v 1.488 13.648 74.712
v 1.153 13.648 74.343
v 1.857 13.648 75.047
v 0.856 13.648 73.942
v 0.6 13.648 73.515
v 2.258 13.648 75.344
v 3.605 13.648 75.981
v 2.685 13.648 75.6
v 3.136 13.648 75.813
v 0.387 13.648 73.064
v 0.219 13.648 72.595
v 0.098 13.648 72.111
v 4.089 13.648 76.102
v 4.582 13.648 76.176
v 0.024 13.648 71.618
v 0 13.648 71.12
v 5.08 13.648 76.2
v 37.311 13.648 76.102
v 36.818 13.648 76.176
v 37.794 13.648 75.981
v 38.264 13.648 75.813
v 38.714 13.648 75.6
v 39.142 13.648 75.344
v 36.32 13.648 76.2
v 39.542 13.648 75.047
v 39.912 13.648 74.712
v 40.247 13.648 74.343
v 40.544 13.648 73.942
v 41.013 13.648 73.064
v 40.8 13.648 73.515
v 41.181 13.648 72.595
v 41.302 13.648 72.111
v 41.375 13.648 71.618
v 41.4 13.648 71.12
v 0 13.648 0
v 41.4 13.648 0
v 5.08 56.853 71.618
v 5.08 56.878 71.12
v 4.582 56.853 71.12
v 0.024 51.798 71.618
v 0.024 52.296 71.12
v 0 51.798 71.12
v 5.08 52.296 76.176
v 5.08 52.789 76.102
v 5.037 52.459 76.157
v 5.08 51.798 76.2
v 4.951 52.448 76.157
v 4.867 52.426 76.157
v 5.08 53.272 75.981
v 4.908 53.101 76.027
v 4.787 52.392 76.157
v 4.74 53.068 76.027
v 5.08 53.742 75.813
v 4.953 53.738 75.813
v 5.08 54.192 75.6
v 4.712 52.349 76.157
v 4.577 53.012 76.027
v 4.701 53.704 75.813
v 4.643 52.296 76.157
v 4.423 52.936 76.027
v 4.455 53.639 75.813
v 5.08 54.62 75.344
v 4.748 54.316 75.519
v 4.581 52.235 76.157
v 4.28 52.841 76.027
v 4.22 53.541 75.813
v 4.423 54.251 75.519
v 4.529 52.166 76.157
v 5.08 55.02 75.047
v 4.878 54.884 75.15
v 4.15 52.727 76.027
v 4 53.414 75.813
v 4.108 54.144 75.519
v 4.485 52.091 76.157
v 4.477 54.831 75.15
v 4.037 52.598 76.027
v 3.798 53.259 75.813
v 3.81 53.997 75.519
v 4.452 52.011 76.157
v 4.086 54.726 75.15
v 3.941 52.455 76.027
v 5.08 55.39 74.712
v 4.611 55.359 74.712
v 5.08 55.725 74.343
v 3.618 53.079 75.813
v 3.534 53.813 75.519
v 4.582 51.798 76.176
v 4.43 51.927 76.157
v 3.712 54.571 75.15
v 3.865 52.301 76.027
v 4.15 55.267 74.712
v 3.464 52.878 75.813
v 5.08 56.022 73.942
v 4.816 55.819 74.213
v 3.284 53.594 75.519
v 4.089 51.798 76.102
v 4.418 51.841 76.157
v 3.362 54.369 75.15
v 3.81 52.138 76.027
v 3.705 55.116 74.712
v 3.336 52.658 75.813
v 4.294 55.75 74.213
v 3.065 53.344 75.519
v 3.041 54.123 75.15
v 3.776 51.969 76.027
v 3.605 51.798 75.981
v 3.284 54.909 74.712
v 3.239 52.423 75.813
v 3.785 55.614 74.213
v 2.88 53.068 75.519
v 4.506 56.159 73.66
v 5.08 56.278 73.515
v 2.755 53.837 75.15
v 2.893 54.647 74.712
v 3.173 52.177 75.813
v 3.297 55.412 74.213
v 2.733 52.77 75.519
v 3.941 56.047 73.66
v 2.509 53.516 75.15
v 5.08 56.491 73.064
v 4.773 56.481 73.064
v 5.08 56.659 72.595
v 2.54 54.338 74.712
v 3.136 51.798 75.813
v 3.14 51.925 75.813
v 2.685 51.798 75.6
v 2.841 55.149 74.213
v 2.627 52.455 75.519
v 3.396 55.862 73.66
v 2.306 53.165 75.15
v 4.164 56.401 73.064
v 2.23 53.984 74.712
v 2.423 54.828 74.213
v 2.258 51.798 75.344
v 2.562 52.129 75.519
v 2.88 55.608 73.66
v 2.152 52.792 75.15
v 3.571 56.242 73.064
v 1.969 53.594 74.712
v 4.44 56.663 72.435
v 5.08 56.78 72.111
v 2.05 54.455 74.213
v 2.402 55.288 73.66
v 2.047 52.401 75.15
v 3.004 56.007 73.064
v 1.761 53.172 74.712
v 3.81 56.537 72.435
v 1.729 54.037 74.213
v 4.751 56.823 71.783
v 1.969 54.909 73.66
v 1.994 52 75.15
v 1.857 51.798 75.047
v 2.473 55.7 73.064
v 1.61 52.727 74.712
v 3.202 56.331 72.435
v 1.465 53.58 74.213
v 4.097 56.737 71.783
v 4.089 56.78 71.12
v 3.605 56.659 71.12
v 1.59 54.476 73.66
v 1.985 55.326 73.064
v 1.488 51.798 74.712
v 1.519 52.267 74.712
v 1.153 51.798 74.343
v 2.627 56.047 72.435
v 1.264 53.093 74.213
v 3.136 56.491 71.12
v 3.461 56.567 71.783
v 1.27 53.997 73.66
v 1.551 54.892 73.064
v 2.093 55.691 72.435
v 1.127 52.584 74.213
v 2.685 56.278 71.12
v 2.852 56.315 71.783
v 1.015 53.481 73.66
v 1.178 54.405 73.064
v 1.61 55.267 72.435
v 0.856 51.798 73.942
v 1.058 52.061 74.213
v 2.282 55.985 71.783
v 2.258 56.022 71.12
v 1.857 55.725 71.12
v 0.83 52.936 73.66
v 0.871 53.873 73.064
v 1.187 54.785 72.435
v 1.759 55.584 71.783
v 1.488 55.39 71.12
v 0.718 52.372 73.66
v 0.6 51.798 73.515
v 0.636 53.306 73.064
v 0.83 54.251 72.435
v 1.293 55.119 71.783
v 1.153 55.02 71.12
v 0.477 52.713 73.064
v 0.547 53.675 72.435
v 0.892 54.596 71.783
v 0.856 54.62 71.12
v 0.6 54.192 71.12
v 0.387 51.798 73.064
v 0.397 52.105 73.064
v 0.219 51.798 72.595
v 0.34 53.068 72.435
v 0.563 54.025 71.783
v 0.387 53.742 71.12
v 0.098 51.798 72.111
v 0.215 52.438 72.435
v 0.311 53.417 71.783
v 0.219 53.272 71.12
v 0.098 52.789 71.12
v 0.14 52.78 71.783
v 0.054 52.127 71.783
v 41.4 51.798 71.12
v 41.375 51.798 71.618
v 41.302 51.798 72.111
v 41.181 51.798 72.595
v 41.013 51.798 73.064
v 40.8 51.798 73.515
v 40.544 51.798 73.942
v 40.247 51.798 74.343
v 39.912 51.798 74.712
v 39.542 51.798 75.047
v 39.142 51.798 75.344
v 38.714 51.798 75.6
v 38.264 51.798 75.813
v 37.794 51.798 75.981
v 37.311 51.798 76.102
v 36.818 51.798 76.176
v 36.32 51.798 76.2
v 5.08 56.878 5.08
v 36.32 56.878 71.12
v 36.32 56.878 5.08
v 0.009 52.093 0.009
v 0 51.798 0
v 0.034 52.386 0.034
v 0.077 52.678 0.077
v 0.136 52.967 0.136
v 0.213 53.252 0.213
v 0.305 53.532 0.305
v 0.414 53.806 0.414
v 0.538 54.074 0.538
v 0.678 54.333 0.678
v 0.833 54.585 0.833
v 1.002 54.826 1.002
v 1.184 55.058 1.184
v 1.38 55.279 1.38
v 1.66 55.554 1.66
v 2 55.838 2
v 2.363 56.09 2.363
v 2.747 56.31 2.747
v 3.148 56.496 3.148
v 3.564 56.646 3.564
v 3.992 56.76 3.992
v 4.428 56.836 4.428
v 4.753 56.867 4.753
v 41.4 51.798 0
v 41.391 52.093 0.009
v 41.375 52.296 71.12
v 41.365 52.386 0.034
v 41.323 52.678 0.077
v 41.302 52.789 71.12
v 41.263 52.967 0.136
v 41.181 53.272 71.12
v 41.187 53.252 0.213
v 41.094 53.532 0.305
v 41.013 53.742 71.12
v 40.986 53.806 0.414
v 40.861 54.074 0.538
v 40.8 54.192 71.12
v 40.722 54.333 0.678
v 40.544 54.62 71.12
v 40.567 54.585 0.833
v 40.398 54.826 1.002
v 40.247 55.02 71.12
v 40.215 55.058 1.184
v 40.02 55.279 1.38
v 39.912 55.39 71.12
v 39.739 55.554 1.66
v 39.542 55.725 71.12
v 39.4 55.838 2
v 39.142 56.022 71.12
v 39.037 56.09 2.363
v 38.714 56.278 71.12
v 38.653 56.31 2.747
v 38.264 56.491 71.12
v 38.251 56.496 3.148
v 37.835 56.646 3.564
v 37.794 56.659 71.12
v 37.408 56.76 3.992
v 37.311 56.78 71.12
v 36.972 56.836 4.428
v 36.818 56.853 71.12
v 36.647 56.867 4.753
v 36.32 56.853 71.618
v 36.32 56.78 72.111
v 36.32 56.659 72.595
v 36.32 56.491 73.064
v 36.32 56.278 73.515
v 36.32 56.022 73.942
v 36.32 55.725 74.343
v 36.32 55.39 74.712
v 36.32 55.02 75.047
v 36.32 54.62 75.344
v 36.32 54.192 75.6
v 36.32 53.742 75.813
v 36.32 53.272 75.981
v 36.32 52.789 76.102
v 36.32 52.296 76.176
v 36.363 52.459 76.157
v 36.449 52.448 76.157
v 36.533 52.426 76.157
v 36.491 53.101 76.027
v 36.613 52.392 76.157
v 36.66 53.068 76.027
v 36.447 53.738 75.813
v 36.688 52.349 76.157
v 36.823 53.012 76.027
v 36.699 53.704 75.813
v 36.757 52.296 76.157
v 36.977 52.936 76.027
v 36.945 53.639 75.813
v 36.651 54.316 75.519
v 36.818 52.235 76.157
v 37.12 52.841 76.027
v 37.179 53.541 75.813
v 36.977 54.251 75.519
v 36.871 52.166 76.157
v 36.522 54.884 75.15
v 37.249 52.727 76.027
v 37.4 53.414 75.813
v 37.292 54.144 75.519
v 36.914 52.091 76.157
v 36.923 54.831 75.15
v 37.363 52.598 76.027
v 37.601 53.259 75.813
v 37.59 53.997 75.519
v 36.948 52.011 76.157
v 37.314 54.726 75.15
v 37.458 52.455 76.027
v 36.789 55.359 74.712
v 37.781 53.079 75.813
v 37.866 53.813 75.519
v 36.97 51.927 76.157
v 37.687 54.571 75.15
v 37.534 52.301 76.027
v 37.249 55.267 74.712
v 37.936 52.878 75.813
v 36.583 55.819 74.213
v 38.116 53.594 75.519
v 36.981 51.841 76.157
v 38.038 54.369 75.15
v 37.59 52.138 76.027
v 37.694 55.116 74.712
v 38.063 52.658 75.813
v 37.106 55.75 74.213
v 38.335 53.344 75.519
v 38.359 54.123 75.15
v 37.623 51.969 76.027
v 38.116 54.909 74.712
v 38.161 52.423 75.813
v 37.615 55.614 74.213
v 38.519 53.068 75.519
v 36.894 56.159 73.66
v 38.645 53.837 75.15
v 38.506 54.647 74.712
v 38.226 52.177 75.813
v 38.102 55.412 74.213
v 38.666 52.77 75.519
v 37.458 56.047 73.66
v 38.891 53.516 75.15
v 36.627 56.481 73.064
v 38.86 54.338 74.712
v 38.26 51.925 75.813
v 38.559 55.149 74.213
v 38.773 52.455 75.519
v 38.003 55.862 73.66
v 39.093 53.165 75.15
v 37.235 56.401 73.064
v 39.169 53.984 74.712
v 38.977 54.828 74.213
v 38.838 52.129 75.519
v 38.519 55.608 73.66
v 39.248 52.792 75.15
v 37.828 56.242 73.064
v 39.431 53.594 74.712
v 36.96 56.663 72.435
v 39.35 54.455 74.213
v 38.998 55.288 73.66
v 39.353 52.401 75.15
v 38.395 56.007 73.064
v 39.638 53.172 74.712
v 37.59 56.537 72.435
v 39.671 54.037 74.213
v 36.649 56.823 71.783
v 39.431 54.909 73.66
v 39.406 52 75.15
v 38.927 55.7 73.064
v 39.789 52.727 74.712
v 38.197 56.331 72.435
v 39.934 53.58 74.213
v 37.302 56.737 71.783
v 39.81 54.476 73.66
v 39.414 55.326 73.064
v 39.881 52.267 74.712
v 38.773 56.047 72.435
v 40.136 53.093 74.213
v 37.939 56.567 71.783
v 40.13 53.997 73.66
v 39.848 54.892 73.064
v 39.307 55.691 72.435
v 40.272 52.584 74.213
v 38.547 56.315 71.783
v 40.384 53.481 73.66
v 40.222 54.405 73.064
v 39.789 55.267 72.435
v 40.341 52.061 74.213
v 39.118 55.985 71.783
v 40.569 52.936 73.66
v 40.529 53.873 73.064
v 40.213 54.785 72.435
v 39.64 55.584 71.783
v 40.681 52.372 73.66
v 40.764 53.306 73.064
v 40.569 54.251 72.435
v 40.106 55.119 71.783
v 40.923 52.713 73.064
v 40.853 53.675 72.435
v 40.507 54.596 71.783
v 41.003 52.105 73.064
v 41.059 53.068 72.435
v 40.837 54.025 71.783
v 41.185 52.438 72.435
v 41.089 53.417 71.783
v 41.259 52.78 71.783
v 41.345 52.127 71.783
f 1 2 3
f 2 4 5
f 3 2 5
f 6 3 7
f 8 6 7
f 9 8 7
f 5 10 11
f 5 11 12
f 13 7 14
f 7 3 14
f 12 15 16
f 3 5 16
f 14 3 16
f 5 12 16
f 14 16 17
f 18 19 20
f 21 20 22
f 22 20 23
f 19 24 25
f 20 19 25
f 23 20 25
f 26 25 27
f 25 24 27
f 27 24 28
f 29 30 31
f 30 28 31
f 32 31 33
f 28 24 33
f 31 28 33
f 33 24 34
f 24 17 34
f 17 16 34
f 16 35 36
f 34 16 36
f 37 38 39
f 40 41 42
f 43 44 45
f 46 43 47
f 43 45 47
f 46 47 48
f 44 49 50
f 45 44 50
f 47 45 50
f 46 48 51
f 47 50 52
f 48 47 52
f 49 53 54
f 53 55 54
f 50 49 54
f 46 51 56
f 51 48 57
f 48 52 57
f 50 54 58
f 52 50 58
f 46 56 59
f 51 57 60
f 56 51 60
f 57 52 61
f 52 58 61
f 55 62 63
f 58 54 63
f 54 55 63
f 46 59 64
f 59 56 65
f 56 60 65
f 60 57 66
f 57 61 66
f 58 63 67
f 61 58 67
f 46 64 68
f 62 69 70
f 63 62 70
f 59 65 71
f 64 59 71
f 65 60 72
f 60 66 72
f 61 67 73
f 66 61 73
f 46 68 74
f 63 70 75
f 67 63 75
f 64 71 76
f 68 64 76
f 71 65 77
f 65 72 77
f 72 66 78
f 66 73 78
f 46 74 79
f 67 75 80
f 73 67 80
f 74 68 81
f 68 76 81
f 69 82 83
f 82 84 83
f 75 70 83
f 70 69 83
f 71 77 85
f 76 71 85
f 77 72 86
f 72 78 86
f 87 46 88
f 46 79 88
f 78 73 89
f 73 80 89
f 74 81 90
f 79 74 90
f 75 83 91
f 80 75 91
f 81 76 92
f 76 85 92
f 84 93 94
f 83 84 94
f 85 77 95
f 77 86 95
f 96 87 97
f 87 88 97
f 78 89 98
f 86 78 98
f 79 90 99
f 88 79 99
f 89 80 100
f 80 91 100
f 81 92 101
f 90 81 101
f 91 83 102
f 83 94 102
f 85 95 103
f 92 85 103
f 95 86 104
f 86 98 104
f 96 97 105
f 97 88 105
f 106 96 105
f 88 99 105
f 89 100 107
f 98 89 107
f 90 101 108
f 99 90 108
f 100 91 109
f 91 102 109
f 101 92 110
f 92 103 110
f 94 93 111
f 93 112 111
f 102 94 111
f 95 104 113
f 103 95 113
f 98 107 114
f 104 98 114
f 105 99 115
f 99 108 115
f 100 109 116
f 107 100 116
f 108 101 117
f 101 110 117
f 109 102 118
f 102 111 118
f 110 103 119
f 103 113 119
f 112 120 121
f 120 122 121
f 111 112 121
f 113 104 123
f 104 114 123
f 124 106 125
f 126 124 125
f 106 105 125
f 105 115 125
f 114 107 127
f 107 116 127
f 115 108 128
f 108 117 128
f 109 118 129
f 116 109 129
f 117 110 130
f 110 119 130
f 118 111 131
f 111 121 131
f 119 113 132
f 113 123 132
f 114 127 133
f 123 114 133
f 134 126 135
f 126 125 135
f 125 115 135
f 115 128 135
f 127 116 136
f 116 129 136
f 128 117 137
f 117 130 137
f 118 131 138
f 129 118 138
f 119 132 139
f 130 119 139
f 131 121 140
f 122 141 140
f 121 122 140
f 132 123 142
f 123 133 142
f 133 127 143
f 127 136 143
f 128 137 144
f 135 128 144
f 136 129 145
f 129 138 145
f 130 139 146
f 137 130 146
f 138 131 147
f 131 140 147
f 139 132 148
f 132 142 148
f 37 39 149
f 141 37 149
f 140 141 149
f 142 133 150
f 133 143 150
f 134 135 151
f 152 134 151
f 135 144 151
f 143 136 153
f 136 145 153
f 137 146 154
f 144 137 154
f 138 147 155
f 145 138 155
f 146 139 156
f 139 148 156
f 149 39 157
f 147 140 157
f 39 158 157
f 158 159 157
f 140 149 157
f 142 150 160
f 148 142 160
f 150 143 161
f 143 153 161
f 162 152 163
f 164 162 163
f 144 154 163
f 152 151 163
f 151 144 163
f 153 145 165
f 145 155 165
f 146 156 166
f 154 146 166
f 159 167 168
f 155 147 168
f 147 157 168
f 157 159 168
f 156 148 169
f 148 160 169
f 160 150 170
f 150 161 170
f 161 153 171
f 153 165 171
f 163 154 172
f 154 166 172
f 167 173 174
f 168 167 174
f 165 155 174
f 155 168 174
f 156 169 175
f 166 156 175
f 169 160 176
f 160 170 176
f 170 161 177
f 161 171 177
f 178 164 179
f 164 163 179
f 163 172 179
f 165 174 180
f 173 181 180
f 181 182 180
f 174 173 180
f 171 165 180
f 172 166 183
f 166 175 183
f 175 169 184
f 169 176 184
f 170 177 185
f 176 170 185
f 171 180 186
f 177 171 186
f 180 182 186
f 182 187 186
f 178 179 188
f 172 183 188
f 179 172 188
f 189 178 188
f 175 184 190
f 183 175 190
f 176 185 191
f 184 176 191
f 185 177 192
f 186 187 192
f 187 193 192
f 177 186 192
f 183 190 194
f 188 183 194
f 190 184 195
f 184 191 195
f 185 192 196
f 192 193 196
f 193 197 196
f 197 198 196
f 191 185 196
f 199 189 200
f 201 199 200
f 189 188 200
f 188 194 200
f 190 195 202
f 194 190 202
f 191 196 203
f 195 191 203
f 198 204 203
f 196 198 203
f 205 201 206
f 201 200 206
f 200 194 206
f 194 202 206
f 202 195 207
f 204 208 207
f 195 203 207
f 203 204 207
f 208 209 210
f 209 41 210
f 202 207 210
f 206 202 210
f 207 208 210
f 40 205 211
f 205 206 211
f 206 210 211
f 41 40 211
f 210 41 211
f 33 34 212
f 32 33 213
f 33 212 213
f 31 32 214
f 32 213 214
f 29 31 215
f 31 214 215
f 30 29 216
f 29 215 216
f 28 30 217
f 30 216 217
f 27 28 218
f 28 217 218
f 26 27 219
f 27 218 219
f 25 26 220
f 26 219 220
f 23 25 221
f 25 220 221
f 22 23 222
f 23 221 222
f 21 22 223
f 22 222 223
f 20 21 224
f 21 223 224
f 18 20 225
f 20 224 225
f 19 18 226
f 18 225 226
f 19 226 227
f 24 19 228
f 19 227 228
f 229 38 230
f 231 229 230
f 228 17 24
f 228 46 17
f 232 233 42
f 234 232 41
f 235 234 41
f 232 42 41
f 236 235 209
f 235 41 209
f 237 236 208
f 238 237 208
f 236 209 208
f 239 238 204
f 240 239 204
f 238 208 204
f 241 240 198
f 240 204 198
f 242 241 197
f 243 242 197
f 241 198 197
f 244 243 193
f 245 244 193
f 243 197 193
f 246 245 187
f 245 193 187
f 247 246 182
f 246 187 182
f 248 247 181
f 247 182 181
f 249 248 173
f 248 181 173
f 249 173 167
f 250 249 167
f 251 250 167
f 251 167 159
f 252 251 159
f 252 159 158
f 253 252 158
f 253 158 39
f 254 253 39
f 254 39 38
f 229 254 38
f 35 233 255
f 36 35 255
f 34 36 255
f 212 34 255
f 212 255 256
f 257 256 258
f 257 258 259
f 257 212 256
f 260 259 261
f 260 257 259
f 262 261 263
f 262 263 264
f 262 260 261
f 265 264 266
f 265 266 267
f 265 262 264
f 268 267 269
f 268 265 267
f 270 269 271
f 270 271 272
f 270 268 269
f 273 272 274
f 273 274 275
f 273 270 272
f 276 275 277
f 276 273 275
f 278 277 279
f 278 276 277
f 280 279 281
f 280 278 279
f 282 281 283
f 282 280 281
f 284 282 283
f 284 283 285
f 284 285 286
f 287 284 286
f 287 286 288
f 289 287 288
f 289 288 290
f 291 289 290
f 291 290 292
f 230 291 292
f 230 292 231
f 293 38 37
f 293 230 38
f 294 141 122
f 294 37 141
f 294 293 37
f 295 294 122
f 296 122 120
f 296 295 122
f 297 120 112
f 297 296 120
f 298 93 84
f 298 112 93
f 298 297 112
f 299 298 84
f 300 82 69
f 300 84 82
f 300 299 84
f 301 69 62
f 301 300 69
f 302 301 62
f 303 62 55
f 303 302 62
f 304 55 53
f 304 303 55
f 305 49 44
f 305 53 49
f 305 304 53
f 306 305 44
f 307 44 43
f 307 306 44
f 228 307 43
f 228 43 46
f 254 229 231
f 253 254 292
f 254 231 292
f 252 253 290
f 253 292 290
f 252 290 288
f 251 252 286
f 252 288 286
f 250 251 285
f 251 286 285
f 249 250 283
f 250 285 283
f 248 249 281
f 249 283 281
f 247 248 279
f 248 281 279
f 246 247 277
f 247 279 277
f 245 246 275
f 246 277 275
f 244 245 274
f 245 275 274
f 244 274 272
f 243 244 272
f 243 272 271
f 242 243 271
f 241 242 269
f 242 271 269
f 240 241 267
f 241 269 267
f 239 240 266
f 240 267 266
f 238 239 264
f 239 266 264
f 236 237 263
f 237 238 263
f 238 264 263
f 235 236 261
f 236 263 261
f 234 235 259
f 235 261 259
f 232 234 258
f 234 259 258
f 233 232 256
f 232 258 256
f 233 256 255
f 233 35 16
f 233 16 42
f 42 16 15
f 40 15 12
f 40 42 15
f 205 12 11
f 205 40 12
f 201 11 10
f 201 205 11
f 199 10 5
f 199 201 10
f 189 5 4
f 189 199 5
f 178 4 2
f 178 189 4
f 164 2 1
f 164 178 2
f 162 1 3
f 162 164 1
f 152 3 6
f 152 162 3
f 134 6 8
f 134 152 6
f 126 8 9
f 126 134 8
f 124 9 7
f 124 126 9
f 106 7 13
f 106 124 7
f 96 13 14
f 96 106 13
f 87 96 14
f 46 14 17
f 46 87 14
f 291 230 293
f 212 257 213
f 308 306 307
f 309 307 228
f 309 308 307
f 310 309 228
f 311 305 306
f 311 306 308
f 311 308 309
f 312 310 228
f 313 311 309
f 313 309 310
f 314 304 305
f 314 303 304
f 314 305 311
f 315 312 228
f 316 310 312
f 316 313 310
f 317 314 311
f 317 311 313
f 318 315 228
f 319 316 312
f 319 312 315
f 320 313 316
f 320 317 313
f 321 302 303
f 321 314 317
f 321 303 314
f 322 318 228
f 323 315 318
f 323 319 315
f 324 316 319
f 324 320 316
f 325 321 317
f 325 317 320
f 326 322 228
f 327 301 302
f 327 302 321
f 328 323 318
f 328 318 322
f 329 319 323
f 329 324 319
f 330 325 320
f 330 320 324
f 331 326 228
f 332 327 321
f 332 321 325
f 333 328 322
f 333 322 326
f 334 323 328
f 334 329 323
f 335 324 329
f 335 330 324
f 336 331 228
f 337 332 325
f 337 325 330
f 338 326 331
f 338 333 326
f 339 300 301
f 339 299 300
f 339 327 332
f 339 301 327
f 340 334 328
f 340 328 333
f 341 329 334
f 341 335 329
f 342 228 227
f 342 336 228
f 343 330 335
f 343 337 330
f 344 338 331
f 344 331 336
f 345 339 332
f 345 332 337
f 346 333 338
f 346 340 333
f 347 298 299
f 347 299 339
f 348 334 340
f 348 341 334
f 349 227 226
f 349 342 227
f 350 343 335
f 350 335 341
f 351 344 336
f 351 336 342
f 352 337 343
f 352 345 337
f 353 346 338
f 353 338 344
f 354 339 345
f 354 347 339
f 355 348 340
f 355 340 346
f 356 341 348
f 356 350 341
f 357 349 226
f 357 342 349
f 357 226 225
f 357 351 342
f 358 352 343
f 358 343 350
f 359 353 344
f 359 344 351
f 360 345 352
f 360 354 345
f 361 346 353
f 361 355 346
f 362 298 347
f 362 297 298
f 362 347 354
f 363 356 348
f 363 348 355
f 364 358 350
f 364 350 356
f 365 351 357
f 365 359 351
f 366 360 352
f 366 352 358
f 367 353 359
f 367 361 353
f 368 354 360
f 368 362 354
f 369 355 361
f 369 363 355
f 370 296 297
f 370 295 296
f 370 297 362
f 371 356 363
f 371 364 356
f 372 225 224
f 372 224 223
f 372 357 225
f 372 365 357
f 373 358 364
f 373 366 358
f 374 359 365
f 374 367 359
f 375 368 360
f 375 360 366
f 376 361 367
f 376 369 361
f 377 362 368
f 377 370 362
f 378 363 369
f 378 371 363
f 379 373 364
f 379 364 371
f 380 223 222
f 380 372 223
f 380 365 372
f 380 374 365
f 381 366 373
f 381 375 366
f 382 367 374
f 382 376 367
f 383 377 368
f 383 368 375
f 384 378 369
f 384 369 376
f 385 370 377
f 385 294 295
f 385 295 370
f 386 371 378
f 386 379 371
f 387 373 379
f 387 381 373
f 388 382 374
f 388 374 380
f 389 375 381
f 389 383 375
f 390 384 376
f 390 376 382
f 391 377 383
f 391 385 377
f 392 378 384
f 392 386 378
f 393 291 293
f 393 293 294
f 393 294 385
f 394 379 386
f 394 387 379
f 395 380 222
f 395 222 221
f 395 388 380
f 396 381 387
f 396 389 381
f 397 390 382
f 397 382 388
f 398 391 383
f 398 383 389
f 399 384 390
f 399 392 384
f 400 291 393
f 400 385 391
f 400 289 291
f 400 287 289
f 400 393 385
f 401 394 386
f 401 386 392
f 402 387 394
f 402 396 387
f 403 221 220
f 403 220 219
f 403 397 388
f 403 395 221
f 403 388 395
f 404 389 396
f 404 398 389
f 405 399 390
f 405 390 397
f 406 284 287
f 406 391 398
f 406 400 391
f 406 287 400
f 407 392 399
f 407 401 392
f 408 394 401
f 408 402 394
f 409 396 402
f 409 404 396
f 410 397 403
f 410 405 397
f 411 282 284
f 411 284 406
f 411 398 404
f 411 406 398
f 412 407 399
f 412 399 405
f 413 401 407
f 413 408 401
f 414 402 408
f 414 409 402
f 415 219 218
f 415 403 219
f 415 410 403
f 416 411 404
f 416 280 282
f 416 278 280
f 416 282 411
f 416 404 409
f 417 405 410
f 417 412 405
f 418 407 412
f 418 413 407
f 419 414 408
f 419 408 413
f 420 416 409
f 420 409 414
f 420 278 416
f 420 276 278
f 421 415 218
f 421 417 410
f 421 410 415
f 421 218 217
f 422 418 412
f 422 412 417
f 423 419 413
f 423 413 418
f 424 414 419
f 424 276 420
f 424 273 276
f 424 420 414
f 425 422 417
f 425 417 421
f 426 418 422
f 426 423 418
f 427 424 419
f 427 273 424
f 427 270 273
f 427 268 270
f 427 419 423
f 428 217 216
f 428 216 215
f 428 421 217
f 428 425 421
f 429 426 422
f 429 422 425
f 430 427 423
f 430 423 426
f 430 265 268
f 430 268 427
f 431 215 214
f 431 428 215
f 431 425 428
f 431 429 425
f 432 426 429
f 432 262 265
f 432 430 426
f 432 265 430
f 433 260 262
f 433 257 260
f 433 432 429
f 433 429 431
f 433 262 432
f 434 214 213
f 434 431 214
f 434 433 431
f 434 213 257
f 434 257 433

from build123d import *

# Parameters (mm, degrees)
F0_W     = 41.399673
F0_H     = 43.229849
F1_DEPTH = 76.2
F2_R     = 5.08


with BuildPart() as f1:
    # F0 (on Top) → F1 (new body)
    with BuildSketch(Plane.XY):
        with Locations((20.699836, 35.262763)):
            Rectangle(F0_W, F0_H)
    extrude(amount=F1_DEPTH)

    # F2
    f2_edges = [f1.edges().sort_by_distance(p)[0] for p in [
        (41.399673, 56.877688, 38.1),
        (0, 56.877688, 38.1),
        (20.699836, 56.877688, 0),
        (20.699836, 56.877688, 76.2),
        (41.399673, 35.262764, 76.2),
        (0, 35.262764, 76.2),
    ]]
    fillet(f2_edges, radius=F2_R)


solid = f1.part
